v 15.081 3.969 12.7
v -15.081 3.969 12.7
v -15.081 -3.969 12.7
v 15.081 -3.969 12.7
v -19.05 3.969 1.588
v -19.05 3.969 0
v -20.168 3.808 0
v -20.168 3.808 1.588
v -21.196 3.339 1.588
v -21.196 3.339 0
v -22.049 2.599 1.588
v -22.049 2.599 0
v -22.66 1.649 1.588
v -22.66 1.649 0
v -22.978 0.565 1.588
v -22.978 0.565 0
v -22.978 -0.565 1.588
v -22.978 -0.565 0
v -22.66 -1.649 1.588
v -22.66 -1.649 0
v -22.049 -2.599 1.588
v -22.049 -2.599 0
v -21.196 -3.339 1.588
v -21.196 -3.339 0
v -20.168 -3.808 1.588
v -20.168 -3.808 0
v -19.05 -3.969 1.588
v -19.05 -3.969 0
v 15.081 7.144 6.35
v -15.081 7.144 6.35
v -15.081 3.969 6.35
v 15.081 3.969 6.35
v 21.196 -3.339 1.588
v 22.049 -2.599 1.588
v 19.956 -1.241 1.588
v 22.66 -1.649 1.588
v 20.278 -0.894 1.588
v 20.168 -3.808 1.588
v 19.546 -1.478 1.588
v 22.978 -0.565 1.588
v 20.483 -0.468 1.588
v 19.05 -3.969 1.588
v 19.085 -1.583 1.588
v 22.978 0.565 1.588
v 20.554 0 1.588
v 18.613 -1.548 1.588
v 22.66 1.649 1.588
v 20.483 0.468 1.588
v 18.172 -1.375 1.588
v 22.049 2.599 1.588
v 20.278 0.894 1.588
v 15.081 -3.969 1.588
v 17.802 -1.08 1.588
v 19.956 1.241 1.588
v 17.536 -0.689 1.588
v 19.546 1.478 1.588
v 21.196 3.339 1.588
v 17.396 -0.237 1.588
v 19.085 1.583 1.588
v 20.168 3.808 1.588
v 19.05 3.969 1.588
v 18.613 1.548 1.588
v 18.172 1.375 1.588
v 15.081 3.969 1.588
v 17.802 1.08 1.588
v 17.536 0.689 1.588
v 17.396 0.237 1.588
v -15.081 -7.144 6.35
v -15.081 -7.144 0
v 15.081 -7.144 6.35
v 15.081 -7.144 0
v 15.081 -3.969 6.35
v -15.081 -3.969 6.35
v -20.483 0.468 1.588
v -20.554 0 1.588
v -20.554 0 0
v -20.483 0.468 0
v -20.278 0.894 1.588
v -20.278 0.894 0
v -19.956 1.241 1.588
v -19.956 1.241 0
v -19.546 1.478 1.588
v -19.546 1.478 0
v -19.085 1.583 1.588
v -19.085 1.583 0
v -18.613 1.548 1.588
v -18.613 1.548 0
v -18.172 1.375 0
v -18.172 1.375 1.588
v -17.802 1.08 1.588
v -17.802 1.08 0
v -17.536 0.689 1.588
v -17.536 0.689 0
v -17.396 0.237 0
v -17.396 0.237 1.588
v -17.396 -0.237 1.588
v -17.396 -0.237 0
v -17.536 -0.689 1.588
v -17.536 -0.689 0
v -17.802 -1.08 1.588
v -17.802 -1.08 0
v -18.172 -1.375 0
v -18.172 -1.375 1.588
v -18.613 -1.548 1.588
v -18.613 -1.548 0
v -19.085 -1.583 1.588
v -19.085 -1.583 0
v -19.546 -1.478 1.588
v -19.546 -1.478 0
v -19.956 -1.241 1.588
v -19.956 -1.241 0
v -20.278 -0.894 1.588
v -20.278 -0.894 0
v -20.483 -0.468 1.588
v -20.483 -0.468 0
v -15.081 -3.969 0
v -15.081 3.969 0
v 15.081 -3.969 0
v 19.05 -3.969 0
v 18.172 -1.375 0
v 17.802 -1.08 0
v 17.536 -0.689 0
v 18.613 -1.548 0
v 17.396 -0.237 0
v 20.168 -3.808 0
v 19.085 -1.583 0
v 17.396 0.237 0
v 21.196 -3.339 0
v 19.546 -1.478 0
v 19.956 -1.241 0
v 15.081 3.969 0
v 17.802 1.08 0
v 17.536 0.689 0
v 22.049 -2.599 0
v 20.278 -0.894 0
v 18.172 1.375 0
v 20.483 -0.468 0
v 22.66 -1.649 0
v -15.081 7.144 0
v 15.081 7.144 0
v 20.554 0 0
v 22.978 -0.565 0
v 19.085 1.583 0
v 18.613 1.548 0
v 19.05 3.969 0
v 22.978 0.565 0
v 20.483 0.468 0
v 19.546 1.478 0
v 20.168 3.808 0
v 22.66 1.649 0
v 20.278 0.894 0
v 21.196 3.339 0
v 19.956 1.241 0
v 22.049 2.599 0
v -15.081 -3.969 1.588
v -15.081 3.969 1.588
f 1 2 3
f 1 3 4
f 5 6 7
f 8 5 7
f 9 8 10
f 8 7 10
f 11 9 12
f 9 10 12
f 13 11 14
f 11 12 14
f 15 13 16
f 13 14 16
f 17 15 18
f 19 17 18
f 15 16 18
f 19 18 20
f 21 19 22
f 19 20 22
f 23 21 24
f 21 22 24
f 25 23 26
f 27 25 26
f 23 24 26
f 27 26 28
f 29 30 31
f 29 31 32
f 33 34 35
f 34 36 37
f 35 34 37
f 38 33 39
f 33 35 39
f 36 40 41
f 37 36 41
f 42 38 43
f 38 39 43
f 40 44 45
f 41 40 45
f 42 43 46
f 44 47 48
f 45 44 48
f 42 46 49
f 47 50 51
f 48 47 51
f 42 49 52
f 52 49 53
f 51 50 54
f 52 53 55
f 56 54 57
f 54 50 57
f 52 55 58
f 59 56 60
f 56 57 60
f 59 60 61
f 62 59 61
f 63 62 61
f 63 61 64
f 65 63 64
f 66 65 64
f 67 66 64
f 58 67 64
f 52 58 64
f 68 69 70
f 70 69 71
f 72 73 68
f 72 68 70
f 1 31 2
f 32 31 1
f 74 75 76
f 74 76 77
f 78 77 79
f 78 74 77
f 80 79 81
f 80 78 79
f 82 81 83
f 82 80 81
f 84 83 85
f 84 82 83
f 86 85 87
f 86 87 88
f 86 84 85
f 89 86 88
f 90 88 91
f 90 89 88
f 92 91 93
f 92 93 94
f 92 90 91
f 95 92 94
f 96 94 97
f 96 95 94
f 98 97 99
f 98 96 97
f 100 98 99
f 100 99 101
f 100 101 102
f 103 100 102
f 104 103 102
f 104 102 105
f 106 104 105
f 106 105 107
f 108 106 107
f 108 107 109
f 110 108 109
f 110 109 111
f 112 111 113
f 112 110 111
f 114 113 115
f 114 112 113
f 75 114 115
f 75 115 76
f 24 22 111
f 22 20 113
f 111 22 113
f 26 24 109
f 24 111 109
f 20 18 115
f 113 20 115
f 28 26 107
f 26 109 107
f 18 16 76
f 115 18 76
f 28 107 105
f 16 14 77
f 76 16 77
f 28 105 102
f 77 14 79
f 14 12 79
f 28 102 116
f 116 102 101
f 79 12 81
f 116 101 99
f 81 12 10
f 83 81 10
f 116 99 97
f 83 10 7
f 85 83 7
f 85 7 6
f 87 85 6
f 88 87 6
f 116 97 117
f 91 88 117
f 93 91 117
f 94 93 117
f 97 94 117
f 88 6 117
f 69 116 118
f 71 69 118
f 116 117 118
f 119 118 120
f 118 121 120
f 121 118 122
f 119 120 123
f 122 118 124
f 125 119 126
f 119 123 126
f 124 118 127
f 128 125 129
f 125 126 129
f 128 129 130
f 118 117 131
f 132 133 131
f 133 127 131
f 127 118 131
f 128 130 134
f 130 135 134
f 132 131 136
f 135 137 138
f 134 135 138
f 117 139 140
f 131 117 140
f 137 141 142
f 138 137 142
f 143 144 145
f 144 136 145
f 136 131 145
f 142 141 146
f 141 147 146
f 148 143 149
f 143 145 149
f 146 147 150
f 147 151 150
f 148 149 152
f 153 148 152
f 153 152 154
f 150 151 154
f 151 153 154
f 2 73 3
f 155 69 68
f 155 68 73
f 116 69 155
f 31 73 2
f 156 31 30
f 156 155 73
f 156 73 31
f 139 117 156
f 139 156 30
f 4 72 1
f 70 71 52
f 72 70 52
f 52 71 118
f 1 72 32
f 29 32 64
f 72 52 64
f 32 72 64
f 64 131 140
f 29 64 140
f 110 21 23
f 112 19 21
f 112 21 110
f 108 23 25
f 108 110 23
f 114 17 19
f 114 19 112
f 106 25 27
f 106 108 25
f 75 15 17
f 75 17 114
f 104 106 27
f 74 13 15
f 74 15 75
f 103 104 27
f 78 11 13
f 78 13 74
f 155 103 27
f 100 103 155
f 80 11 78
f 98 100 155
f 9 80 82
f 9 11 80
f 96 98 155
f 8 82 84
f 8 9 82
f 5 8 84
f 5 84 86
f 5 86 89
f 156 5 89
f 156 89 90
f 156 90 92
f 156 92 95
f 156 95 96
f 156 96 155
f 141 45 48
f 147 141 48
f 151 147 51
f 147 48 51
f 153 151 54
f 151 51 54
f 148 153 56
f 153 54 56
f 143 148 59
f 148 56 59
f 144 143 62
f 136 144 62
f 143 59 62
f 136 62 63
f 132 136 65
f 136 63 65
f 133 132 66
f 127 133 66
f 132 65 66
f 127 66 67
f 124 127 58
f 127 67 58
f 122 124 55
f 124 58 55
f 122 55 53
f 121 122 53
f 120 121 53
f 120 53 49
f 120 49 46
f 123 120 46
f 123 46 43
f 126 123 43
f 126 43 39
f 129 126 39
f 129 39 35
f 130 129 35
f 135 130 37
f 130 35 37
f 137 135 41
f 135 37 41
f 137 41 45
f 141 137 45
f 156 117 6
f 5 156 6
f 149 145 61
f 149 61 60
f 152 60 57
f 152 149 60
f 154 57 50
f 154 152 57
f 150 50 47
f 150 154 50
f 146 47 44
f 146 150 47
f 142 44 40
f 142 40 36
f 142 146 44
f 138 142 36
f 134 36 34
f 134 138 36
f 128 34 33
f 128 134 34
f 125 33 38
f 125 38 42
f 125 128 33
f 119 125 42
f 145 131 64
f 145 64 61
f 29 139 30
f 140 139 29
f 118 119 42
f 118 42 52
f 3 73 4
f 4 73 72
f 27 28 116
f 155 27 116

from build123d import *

# Parameters (mm, degrees)
SKETCH1_W           = 30.1625
SKETCH1_H           = 14.2875
BOSS_EXTRUDE1_DEPTH = 6.35
SKETCH2_W           = 30.1625
SKETCH2_H           = 7.9375
BOSS_EXTRUDE2_DEPTH = 6.35
BOSS_EXTRUDE3_DEPTH = 1.5875
SKETCH4_R           = 1.5875
CUT_EXTRUDE1_DEPTH  = 1.5875


with BuildPart() as part:
    # Sketch1 → Boss-Extrude1 (new body)
    with BuildSketch(Plane.XY):
        Rectangle(SKETCH1_W, SKETCH1_H)
    extrude(amount=BOSS_EXTRUDE1_DEPTH)

    # Sketch2 → Boss-Extrude2 (add)
    with BuildSketch(Plane.XY.offset(6.35)):
        Rectangle(SKETCH2_W, SKETCH2_H)
    extrude(amount=BOSS_EXTRUDE2_DEPTH)

    # Sketch3 → Boss-Extrude3 (add)
    with BuildSketch(Plane(origin=(0, 0, 0), x_dir=(-1, 0, 0), z_dir=(0, 0, -1))):
        with BuildLine():
            ThreePointArc((-15.08125, 0), (-16.243669962, 2.806330038), (-19.05, 3.96875))
            Line((-19.05, 3.96875), (-19.05, -3.96875))
            ThreePointArc((-19.05, -3.96875), (-16.243669962, -2.806330038), (-15.08125, 0))
        make_face()
        with BuildLine():
            Line((-19.05, -3.96875), (-19.05, 3.96875))
            ThreePointArc((-19.05, 3.96875), (-23.01875, 0), (-19.05, -3.96875))
        make_face()
        with BuildLine():
            Line((-15.08125, 3.96875), (-19.05, 3.96875))
            ThreePointArc((-19.05, 3.96875), (-16.243669962, 2.806330038), (-15.08125, 0))
            Line((-15.08125, 0), (-15.08125, 3.96875))
        make_face()
        with BuildLine():
            ThreePointArc((-15.08125, 0), (-16.243669962, -2.806330038), (-19.05, -3.96875))
            Line((-19.05, -3.96875), (-15.08125, -3.96875))
            Line((-15.08125, -3.96875), (-15.08125, 0))
        make_face()
    boss_extrude3 = extrude(amount=-BOSS_EXTRUDE3_DEPTH)

    # Sketch4 → Cut-Extrude1 (cut)
    with BuildSketch(Plane.XY.offset(1.5875)):
        with Locations((18.966101938, 0)):
            Circle(SKETCH4_R)
    cut_extrude1 = extrude(amount=-CUT_EXTRUDE1_DEPTH, mode=Mode.SUBTRACT)

    # Mirror1: Boss-Extrude3, Cut-Extrude1 across plane
    add(boss_extrude3.mirror(Plane(origin=(0, 0, 0), x_dir=(0, 0, 1), z_dir=(1, 0, 0))))
    add(cut_extrude1.mirror(Plane(origin=(0, 0, 0), x_dir=(0, 0, 1), z_dir=(1, 0, 0))), mode=Mode.SUBTRACT)


solid = part.part
